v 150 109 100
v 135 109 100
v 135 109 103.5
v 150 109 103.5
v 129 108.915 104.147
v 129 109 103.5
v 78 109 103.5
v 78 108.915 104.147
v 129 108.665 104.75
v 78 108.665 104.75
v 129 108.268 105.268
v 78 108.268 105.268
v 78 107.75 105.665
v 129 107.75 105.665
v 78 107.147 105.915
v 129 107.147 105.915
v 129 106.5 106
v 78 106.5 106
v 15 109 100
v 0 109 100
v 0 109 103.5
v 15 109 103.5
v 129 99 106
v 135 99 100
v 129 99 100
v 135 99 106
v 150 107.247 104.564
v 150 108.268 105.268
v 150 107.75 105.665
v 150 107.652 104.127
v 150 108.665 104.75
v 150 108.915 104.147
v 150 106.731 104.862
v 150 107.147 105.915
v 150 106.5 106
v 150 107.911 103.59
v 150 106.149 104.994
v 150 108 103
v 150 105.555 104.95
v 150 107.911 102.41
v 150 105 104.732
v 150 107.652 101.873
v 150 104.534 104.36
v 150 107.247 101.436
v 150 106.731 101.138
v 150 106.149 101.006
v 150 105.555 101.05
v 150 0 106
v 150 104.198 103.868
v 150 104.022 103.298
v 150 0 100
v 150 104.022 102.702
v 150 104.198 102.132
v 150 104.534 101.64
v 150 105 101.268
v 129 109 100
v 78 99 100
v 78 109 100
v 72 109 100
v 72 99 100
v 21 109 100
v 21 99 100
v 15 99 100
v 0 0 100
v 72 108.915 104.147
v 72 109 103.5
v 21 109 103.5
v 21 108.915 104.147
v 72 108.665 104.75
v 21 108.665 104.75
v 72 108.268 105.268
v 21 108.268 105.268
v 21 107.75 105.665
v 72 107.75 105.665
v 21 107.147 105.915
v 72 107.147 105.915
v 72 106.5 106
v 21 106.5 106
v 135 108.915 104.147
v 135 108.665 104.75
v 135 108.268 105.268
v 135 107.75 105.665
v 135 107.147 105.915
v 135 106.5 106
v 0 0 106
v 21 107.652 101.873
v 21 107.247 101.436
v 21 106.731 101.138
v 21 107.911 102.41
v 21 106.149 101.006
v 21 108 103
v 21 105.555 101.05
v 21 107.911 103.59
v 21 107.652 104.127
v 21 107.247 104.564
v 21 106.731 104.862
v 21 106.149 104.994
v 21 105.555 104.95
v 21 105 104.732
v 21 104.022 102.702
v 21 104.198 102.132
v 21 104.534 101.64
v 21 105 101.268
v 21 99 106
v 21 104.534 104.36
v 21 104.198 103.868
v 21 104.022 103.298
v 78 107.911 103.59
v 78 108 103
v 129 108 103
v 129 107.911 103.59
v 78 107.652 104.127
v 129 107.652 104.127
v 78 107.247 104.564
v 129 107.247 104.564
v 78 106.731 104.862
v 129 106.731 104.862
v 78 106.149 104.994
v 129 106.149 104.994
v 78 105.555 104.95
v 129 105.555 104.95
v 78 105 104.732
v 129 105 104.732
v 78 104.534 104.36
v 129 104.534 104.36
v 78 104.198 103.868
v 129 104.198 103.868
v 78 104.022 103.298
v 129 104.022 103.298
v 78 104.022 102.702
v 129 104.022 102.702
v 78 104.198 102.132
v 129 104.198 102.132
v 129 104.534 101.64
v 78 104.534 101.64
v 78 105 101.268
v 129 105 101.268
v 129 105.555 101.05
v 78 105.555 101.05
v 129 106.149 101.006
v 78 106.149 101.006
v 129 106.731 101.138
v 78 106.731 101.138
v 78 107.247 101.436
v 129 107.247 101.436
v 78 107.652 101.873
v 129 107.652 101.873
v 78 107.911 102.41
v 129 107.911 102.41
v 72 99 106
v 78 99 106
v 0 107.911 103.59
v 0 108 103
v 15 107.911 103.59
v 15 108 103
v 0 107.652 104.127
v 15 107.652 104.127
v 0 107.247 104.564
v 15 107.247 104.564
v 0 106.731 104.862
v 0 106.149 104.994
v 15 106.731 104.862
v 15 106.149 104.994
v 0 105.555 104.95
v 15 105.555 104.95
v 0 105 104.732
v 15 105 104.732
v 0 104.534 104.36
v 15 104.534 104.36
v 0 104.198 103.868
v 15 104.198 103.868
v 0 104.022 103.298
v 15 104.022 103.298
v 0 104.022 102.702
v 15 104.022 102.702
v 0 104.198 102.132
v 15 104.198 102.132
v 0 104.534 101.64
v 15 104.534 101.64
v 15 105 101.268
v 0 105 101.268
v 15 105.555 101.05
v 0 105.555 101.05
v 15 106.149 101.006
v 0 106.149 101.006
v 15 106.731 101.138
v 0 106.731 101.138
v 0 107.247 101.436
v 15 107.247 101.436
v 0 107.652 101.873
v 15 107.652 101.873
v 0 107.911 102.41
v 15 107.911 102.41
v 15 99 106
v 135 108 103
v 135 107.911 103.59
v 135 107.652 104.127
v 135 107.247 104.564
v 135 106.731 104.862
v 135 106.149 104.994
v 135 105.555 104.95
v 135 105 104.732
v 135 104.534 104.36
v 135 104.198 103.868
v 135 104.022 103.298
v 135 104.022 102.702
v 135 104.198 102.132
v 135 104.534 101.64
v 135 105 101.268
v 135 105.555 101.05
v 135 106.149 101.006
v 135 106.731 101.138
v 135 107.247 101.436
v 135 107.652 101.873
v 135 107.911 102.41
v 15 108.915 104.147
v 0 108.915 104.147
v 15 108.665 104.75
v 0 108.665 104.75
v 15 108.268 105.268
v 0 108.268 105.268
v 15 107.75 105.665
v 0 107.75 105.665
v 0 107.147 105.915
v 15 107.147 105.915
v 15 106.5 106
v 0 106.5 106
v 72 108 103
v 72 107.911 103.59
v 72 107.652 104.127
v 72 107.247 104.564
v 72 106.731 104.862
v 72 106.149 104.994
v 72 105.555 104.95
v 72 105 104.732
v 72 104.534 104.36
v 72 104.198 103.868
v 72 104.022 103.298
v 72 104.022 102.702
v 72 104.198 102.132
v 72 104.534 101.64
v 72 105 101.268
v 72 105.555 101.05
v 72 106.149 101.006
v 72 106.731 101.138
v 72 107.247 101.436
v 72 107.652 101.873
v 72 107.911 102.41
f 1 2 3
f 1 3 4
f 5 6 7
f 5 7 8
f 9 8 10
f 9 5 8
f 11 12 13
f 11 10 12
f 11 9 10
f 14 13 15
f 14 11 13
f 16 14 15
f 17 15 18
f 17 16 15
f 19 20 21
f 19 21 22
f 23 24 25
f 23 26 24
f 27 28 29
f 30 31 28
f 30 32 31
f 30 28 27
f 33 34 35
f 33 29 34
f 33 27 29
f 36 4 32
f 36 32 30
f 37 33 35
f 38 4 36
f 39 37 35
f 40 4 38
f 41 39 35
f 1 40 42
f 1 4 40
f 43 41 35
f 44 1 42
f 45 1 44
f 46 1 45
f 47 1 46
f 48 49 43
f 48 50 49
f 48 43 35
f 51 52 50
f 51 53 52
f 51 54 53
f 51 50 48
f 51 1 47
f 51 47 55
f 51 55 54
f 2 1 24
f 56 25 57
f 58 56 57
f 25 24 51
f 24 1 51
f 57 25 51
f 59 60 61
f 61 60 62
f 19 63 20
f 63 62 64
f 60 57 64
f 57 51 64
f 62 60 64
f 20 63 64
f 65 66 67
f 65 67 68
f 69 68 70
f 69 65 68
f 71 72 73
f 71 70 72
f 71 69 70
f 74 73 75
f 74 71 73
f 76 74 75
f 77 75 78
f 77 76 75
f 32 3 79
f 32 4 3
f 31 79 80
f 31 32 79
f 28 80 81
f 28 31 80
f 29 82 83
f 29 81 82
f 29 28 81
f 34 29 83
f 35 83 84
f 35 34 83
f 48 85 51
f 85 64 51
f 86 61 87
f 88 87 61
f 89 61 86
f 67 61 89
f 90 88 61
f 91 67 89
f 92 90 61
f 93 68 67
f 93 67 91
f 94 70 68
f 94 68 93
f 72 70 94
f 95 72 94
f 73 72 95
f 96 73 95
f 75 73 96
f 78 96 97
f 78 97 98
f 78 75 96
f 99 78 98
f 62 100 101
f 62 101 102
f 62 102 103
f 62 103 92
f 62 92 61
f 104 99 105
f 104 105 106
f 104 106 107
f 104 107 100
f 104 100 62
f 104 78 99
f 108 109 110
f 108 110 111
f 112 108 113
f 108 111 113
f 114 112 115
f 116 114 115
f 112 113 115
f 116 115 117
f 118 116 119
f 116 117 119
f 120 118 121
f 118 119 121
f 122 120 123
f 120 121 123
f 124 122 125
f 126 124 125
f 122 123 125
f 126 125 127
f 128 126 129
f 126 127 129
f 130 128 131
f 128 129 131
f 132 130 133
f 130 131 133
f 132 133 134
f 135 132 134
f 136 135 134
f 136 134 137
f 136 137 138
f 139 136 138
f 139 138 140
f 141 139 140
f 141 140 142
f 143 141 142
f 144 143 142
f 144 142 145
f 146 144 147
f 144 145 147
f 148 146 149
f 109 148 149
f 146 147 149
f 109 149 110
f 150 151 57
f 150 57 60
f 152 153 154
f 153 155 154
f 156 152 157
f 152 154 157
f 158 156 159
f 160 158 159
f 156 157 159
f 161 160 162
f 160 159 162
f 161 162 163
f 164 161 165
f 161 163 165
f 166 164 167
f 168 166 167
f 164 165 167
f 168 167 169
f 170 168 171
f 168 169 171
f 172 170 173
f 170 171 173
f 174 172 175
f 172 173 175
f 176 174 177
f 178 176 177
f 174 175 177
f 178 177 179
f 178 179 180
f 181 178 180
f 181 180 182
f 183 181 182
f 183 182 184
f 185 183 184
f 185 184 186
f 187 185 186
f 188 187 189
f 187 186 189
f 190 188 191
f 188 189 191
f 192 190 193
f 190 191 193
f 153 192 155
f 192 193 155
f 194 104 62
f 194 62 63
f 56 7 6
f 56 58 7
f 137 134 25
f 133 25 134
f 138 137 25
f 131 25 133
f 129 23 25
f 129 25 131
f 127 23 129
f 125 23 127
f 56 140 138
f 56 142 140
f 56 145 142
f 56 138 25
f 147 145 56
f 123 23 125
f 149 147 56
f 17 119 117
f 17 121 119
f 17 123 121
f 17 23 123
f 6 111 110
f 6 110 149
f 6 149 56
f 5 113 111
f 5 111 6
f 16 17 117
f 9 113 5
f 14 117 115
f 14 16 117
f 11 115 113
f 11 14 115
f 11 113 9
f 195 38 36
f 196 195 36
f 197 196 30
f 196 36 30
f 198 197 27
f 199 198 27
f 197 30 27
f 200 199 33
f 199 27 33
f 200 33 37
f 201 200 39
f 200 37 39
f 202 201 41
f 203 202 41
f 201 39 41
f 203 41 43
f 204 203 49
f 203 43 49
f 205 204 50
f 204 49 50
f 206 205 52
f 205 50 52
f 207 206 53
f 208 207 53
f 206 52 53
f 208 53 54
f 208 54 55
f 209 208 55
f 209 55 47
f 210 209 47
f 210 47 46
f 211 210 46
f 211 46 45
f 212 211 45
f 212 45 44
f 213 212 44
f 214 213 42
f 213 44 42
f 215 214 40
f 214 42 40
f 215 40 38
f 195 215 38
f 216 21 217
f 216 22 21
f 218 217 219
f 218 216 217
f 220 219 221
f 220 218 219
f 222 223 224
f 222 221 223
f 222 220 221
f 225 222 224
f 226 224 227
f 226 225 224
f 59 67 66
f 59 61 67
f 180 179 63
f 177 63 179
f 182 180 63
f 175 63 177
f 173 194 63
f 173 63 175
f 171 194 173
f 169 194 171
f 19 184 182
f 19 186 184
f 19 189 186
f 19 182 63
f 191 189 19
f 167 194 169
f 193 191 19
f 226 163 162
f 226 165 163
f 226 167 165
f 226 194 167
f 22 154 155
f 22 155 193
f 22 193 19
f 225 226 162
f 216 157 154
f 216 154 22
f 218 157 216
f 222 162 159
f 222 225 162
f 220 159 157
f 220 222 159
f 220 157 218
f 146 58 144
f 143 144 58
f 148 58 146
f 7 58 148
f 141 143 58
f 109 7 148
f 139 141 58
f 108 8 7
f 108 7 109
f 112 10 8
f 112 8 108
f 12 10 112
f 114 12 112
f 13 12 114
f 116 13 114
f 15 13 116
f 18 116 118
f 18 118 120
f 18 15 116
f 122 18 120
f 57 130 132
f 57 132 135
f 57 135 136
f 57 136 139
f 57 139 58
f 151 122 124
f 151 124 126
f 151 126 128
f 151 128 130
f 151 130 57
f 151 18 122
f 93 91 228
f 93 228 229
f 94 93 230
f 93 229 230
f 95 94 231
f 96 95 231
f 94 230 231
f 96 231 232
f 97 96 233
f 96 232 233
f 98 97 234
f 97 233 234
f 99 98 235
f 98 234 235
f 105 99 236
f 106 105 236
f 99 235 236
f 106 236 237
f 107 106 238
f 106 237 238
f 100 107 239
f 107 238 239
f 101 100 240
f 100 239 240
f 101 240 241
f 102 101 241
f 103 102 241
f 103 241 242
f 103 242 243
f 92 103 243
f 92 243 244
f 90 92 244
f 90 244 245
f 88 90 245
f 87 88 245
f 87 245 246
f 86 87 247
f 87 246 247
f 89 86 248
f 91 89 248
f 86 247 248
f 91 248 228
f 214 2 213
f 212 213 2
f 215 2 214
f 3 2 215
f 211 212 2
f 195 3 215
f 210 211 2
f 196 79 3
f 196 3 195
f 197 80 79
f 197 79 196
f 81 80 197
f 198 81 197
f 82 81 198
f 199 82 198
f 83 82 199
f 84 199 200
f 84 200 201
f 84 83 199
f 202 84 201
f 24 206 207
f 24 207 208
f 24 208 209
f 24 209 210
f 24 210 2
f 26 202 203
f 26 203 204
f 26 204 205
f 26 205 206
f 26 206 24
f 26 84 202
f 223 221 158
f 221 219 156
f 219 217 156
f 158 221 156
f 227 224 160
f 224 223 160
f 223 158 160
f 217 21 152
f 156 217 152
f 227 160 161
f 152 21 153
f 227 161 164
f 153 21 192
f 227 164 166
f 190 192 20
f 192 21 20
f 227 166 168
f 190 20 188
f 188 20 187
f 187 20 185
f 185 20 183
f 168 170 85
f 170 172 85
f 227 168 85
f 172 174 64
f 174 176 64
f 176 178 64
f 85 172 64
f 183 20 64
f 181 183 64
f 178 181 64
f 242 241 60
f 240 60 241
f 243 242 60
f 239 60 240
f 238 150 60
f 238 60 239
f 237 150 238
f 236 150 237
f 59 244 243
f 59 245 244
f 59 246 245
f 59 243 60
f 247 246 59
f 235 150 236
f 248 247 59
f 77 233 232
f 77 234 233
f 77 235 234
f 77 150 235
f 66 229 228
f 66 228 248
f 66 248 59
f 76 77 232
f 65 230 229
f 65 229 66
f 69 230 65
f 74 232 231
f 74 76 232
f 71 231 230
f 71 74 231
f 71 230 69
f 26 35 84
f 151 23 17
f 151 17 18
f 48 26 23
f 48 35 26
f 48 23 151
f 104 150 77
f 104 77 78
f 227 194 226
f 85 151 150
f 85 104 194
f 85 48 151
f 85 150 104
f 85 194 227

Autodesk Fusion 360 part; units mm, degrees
sketch "草图1" plane through (0, 0, 13.3714) normal (0, 0, 1) x (-1, 0, 0)
  line L0 (10.9987, -232.8503) -> (25.9987, -232.8503)
  line L1 (25.9987, -232.8503) -> (25.9987, -126.3503)
  line L2 (25.9987, -126.3503) -> (-124.0013, -126.3503)
  line L3 (-124.0013, -126.3503) -> (-124.0013, -232.8503)
  line L4 (-124.0013, -232.8503) -> (-109.0013, -232.8503)
  line L5 (-109.0013, -232.8503) -> (-109.0013, -225.3503)
  line L6 (-109.0013, -225.3503) -> (-103.0013, -225.3503)
  line L7 (-103.0013, -225.3503) -> (-103.0013, -232.8503)
  line L8 (-103.0013, -232.8503) -> (-52.0013, -232.8503)
  line L9 (-52.0013, -232.8503) -> (-52.0013, -225.3503)
  line L10 (-52.0013, -225.3503) -> (-46.0013, -225.3503)
  line L11 (-46.0013, -225.3503) -> (-46.0013, -232.8503)
  line L12 (-46.0013, -232.8503) -> (4.9987, -232.8503)
  line L13 (4.9987, -232.8503) -> (4.9987, -225.3503)
  line L14 (4.9987, -225.3503) -> (10.9987, -225.3503)
  line L15 (10.9987, -225.3503) -> (10.9987, -232.8503)
  line L16 (-114.0013, -225.3503) -> (-127.4522, -225.3503)
  line L17 (-127.4522, -225.3503) -> (-127.4522, -236.557)
  line L18 (-127.4522, -236.557) -> (-114.0013, -236.557)
  line L19 (-114.0013, -236.557) -> (-114.0013, -225.3503)
  line L20 (-98.0013, -225.3503) -> (-57.0013, -225.3503)
  line L21 (-57.0013, -225.3503) -> (-57.0013, -239)
  line L22 (-57.0013, -239) -> (-98.0013, -239)
  line L23 (-98.0013, -239) -> (-98.0013, -225.3503)
  line L24 (-41.0013, -225.3503) -> (-0.0013, -225.3503)
  line L25 (-0.0013, -225.3503) -> (-0.0013, -240)
  line L26 (-0.0013, -240) -> (-41.0013, -240)
  line L27 (-41.0013, -240) -> (-41.0013, -225.3503)
  line L28 (15.9987, -225.3503) -> (29.1278, -225.3503)
  line L29 (29.1278, -225.3503) -> (29.1278, -239)
  line L30 (29.1278, -239) -> (15.9987, -239)
  line L31 (15.9987, -239) -> (15.9987, -225.3503)
  dimension "d1" = 5
  dimension "d2" = 5
  dimension "d3" = 5
  dimension "d4" = 5
  dimension "d5" = 5
  dimension "d6" = 5
sketch "草图2" plane through (150, 0, 0) normal (1, 0, 0) x (0, 1, 0)
  line L0 (0, 100) -> (109, 100)
  line L1 (109, 100) -> (109, 106)
  line L2 (109, 106) -> (0, 106)
  line L3 (0, 106) -> (0, 100)
  circle A0 centre (106, 103) radius 2
  dimension "d7" = 4
  dimension "d8" = 3
  dimension "d9" = 3
sketch "草图3" plane through (0, 0, 100) normal (0, 0, 1) x (-1, 0, 0)
  line L0 (-3, -29) -> (0, -29)
  line L1 (0, -29) -> (0, 0)
  line L2 (0, 0) -> (-63, 0)
  line L3 (-63, 0) -> (-63, -3)
  line L4 (-63, -3) -> (-3, -3)
  line L5 (-3, -3) -> (-3, -29)
  line L6 (0, -109) -> (-150, -109)
  line L7 (-150, -109) -> (-150, 0)
  line L8 (-150, 0) -> (0, 0)
  line L9 (0, 0) -> (0, -109)
  dimension "d10" = 150
  dimension "d11" = 109
sketch "草图4" plane through (0, 0, 106) normal (0, 0, 1) x (-1, 0, 0)
  line L0 (0, 0) -> (-150, 0)
  line L1 (-150, 0) -> (-150, -109)
  line L2 (-150, -109) -> (0, -109)
  line L3 (0, -109) -> (0, 0)
  line L4 (-135, -99) -> (-129, -99)
  line L5 (-129, -99) -> (-129, -109)
  line L6 (-129, -109) -> (-135, -109)
  line L7 (-135, -109) -> (-135, -99)
  line L8 (-78, -99) -> (-72, -99)
  line L9 (-72, -99) -> (-72, -109)
  line L10 (-72, -109) -> (-78, -109)
  line L11 (-78, -109) -> (-78, -99)
  line L12 (-21, -99) -> (-15, -99)
  line L13 (-15, -99) -> (-15, -109)
  line L14 (-15, -109) -> (-21, -109)
  line L15 (-21, -109) -> (-21, -99)
  dimension "d12" = 6
  dimension "d13" = 10
  dimension "d14" = 15
  dimension "d15" = 6
  dimension "d16" = 10
  dimension "d17" = 6
  dimension "d18" = 10
  dimension "d19" = 72
  dimension "d20" = 15
extrude "拉伸1" add sketch "草图3" along normal blind 6
extrude "拉伸2" cut sketch "草图4" against normal blind 10 contours L2 L12 L13 L14 L15 | L2 L4 L5 L6 L7 | L2 L8 L9 L10 L11
extrude "拉伸3" cut sketch "草图2" against normal blind 170 contours A0
fillet "圆角1" radius 2.5 4 edges at (142.5, 109, 106) (103.5, 109, 106) (46.5, 109, 106) (7.5, 109, 106)
extrude "拉伸4" cut sketch "草图1" against normal blind 25 contours L0 L1 L28 L31 | L0 L1 L28 L29 L30 L31 | L12 L25 L26 L27 | L12 L24 L25 L27 | L3 L4 L16 L19 | L3 L4 L16 L17 L18 L19 | L8 L21 L22 L23 | L8 L20 L21 L23
